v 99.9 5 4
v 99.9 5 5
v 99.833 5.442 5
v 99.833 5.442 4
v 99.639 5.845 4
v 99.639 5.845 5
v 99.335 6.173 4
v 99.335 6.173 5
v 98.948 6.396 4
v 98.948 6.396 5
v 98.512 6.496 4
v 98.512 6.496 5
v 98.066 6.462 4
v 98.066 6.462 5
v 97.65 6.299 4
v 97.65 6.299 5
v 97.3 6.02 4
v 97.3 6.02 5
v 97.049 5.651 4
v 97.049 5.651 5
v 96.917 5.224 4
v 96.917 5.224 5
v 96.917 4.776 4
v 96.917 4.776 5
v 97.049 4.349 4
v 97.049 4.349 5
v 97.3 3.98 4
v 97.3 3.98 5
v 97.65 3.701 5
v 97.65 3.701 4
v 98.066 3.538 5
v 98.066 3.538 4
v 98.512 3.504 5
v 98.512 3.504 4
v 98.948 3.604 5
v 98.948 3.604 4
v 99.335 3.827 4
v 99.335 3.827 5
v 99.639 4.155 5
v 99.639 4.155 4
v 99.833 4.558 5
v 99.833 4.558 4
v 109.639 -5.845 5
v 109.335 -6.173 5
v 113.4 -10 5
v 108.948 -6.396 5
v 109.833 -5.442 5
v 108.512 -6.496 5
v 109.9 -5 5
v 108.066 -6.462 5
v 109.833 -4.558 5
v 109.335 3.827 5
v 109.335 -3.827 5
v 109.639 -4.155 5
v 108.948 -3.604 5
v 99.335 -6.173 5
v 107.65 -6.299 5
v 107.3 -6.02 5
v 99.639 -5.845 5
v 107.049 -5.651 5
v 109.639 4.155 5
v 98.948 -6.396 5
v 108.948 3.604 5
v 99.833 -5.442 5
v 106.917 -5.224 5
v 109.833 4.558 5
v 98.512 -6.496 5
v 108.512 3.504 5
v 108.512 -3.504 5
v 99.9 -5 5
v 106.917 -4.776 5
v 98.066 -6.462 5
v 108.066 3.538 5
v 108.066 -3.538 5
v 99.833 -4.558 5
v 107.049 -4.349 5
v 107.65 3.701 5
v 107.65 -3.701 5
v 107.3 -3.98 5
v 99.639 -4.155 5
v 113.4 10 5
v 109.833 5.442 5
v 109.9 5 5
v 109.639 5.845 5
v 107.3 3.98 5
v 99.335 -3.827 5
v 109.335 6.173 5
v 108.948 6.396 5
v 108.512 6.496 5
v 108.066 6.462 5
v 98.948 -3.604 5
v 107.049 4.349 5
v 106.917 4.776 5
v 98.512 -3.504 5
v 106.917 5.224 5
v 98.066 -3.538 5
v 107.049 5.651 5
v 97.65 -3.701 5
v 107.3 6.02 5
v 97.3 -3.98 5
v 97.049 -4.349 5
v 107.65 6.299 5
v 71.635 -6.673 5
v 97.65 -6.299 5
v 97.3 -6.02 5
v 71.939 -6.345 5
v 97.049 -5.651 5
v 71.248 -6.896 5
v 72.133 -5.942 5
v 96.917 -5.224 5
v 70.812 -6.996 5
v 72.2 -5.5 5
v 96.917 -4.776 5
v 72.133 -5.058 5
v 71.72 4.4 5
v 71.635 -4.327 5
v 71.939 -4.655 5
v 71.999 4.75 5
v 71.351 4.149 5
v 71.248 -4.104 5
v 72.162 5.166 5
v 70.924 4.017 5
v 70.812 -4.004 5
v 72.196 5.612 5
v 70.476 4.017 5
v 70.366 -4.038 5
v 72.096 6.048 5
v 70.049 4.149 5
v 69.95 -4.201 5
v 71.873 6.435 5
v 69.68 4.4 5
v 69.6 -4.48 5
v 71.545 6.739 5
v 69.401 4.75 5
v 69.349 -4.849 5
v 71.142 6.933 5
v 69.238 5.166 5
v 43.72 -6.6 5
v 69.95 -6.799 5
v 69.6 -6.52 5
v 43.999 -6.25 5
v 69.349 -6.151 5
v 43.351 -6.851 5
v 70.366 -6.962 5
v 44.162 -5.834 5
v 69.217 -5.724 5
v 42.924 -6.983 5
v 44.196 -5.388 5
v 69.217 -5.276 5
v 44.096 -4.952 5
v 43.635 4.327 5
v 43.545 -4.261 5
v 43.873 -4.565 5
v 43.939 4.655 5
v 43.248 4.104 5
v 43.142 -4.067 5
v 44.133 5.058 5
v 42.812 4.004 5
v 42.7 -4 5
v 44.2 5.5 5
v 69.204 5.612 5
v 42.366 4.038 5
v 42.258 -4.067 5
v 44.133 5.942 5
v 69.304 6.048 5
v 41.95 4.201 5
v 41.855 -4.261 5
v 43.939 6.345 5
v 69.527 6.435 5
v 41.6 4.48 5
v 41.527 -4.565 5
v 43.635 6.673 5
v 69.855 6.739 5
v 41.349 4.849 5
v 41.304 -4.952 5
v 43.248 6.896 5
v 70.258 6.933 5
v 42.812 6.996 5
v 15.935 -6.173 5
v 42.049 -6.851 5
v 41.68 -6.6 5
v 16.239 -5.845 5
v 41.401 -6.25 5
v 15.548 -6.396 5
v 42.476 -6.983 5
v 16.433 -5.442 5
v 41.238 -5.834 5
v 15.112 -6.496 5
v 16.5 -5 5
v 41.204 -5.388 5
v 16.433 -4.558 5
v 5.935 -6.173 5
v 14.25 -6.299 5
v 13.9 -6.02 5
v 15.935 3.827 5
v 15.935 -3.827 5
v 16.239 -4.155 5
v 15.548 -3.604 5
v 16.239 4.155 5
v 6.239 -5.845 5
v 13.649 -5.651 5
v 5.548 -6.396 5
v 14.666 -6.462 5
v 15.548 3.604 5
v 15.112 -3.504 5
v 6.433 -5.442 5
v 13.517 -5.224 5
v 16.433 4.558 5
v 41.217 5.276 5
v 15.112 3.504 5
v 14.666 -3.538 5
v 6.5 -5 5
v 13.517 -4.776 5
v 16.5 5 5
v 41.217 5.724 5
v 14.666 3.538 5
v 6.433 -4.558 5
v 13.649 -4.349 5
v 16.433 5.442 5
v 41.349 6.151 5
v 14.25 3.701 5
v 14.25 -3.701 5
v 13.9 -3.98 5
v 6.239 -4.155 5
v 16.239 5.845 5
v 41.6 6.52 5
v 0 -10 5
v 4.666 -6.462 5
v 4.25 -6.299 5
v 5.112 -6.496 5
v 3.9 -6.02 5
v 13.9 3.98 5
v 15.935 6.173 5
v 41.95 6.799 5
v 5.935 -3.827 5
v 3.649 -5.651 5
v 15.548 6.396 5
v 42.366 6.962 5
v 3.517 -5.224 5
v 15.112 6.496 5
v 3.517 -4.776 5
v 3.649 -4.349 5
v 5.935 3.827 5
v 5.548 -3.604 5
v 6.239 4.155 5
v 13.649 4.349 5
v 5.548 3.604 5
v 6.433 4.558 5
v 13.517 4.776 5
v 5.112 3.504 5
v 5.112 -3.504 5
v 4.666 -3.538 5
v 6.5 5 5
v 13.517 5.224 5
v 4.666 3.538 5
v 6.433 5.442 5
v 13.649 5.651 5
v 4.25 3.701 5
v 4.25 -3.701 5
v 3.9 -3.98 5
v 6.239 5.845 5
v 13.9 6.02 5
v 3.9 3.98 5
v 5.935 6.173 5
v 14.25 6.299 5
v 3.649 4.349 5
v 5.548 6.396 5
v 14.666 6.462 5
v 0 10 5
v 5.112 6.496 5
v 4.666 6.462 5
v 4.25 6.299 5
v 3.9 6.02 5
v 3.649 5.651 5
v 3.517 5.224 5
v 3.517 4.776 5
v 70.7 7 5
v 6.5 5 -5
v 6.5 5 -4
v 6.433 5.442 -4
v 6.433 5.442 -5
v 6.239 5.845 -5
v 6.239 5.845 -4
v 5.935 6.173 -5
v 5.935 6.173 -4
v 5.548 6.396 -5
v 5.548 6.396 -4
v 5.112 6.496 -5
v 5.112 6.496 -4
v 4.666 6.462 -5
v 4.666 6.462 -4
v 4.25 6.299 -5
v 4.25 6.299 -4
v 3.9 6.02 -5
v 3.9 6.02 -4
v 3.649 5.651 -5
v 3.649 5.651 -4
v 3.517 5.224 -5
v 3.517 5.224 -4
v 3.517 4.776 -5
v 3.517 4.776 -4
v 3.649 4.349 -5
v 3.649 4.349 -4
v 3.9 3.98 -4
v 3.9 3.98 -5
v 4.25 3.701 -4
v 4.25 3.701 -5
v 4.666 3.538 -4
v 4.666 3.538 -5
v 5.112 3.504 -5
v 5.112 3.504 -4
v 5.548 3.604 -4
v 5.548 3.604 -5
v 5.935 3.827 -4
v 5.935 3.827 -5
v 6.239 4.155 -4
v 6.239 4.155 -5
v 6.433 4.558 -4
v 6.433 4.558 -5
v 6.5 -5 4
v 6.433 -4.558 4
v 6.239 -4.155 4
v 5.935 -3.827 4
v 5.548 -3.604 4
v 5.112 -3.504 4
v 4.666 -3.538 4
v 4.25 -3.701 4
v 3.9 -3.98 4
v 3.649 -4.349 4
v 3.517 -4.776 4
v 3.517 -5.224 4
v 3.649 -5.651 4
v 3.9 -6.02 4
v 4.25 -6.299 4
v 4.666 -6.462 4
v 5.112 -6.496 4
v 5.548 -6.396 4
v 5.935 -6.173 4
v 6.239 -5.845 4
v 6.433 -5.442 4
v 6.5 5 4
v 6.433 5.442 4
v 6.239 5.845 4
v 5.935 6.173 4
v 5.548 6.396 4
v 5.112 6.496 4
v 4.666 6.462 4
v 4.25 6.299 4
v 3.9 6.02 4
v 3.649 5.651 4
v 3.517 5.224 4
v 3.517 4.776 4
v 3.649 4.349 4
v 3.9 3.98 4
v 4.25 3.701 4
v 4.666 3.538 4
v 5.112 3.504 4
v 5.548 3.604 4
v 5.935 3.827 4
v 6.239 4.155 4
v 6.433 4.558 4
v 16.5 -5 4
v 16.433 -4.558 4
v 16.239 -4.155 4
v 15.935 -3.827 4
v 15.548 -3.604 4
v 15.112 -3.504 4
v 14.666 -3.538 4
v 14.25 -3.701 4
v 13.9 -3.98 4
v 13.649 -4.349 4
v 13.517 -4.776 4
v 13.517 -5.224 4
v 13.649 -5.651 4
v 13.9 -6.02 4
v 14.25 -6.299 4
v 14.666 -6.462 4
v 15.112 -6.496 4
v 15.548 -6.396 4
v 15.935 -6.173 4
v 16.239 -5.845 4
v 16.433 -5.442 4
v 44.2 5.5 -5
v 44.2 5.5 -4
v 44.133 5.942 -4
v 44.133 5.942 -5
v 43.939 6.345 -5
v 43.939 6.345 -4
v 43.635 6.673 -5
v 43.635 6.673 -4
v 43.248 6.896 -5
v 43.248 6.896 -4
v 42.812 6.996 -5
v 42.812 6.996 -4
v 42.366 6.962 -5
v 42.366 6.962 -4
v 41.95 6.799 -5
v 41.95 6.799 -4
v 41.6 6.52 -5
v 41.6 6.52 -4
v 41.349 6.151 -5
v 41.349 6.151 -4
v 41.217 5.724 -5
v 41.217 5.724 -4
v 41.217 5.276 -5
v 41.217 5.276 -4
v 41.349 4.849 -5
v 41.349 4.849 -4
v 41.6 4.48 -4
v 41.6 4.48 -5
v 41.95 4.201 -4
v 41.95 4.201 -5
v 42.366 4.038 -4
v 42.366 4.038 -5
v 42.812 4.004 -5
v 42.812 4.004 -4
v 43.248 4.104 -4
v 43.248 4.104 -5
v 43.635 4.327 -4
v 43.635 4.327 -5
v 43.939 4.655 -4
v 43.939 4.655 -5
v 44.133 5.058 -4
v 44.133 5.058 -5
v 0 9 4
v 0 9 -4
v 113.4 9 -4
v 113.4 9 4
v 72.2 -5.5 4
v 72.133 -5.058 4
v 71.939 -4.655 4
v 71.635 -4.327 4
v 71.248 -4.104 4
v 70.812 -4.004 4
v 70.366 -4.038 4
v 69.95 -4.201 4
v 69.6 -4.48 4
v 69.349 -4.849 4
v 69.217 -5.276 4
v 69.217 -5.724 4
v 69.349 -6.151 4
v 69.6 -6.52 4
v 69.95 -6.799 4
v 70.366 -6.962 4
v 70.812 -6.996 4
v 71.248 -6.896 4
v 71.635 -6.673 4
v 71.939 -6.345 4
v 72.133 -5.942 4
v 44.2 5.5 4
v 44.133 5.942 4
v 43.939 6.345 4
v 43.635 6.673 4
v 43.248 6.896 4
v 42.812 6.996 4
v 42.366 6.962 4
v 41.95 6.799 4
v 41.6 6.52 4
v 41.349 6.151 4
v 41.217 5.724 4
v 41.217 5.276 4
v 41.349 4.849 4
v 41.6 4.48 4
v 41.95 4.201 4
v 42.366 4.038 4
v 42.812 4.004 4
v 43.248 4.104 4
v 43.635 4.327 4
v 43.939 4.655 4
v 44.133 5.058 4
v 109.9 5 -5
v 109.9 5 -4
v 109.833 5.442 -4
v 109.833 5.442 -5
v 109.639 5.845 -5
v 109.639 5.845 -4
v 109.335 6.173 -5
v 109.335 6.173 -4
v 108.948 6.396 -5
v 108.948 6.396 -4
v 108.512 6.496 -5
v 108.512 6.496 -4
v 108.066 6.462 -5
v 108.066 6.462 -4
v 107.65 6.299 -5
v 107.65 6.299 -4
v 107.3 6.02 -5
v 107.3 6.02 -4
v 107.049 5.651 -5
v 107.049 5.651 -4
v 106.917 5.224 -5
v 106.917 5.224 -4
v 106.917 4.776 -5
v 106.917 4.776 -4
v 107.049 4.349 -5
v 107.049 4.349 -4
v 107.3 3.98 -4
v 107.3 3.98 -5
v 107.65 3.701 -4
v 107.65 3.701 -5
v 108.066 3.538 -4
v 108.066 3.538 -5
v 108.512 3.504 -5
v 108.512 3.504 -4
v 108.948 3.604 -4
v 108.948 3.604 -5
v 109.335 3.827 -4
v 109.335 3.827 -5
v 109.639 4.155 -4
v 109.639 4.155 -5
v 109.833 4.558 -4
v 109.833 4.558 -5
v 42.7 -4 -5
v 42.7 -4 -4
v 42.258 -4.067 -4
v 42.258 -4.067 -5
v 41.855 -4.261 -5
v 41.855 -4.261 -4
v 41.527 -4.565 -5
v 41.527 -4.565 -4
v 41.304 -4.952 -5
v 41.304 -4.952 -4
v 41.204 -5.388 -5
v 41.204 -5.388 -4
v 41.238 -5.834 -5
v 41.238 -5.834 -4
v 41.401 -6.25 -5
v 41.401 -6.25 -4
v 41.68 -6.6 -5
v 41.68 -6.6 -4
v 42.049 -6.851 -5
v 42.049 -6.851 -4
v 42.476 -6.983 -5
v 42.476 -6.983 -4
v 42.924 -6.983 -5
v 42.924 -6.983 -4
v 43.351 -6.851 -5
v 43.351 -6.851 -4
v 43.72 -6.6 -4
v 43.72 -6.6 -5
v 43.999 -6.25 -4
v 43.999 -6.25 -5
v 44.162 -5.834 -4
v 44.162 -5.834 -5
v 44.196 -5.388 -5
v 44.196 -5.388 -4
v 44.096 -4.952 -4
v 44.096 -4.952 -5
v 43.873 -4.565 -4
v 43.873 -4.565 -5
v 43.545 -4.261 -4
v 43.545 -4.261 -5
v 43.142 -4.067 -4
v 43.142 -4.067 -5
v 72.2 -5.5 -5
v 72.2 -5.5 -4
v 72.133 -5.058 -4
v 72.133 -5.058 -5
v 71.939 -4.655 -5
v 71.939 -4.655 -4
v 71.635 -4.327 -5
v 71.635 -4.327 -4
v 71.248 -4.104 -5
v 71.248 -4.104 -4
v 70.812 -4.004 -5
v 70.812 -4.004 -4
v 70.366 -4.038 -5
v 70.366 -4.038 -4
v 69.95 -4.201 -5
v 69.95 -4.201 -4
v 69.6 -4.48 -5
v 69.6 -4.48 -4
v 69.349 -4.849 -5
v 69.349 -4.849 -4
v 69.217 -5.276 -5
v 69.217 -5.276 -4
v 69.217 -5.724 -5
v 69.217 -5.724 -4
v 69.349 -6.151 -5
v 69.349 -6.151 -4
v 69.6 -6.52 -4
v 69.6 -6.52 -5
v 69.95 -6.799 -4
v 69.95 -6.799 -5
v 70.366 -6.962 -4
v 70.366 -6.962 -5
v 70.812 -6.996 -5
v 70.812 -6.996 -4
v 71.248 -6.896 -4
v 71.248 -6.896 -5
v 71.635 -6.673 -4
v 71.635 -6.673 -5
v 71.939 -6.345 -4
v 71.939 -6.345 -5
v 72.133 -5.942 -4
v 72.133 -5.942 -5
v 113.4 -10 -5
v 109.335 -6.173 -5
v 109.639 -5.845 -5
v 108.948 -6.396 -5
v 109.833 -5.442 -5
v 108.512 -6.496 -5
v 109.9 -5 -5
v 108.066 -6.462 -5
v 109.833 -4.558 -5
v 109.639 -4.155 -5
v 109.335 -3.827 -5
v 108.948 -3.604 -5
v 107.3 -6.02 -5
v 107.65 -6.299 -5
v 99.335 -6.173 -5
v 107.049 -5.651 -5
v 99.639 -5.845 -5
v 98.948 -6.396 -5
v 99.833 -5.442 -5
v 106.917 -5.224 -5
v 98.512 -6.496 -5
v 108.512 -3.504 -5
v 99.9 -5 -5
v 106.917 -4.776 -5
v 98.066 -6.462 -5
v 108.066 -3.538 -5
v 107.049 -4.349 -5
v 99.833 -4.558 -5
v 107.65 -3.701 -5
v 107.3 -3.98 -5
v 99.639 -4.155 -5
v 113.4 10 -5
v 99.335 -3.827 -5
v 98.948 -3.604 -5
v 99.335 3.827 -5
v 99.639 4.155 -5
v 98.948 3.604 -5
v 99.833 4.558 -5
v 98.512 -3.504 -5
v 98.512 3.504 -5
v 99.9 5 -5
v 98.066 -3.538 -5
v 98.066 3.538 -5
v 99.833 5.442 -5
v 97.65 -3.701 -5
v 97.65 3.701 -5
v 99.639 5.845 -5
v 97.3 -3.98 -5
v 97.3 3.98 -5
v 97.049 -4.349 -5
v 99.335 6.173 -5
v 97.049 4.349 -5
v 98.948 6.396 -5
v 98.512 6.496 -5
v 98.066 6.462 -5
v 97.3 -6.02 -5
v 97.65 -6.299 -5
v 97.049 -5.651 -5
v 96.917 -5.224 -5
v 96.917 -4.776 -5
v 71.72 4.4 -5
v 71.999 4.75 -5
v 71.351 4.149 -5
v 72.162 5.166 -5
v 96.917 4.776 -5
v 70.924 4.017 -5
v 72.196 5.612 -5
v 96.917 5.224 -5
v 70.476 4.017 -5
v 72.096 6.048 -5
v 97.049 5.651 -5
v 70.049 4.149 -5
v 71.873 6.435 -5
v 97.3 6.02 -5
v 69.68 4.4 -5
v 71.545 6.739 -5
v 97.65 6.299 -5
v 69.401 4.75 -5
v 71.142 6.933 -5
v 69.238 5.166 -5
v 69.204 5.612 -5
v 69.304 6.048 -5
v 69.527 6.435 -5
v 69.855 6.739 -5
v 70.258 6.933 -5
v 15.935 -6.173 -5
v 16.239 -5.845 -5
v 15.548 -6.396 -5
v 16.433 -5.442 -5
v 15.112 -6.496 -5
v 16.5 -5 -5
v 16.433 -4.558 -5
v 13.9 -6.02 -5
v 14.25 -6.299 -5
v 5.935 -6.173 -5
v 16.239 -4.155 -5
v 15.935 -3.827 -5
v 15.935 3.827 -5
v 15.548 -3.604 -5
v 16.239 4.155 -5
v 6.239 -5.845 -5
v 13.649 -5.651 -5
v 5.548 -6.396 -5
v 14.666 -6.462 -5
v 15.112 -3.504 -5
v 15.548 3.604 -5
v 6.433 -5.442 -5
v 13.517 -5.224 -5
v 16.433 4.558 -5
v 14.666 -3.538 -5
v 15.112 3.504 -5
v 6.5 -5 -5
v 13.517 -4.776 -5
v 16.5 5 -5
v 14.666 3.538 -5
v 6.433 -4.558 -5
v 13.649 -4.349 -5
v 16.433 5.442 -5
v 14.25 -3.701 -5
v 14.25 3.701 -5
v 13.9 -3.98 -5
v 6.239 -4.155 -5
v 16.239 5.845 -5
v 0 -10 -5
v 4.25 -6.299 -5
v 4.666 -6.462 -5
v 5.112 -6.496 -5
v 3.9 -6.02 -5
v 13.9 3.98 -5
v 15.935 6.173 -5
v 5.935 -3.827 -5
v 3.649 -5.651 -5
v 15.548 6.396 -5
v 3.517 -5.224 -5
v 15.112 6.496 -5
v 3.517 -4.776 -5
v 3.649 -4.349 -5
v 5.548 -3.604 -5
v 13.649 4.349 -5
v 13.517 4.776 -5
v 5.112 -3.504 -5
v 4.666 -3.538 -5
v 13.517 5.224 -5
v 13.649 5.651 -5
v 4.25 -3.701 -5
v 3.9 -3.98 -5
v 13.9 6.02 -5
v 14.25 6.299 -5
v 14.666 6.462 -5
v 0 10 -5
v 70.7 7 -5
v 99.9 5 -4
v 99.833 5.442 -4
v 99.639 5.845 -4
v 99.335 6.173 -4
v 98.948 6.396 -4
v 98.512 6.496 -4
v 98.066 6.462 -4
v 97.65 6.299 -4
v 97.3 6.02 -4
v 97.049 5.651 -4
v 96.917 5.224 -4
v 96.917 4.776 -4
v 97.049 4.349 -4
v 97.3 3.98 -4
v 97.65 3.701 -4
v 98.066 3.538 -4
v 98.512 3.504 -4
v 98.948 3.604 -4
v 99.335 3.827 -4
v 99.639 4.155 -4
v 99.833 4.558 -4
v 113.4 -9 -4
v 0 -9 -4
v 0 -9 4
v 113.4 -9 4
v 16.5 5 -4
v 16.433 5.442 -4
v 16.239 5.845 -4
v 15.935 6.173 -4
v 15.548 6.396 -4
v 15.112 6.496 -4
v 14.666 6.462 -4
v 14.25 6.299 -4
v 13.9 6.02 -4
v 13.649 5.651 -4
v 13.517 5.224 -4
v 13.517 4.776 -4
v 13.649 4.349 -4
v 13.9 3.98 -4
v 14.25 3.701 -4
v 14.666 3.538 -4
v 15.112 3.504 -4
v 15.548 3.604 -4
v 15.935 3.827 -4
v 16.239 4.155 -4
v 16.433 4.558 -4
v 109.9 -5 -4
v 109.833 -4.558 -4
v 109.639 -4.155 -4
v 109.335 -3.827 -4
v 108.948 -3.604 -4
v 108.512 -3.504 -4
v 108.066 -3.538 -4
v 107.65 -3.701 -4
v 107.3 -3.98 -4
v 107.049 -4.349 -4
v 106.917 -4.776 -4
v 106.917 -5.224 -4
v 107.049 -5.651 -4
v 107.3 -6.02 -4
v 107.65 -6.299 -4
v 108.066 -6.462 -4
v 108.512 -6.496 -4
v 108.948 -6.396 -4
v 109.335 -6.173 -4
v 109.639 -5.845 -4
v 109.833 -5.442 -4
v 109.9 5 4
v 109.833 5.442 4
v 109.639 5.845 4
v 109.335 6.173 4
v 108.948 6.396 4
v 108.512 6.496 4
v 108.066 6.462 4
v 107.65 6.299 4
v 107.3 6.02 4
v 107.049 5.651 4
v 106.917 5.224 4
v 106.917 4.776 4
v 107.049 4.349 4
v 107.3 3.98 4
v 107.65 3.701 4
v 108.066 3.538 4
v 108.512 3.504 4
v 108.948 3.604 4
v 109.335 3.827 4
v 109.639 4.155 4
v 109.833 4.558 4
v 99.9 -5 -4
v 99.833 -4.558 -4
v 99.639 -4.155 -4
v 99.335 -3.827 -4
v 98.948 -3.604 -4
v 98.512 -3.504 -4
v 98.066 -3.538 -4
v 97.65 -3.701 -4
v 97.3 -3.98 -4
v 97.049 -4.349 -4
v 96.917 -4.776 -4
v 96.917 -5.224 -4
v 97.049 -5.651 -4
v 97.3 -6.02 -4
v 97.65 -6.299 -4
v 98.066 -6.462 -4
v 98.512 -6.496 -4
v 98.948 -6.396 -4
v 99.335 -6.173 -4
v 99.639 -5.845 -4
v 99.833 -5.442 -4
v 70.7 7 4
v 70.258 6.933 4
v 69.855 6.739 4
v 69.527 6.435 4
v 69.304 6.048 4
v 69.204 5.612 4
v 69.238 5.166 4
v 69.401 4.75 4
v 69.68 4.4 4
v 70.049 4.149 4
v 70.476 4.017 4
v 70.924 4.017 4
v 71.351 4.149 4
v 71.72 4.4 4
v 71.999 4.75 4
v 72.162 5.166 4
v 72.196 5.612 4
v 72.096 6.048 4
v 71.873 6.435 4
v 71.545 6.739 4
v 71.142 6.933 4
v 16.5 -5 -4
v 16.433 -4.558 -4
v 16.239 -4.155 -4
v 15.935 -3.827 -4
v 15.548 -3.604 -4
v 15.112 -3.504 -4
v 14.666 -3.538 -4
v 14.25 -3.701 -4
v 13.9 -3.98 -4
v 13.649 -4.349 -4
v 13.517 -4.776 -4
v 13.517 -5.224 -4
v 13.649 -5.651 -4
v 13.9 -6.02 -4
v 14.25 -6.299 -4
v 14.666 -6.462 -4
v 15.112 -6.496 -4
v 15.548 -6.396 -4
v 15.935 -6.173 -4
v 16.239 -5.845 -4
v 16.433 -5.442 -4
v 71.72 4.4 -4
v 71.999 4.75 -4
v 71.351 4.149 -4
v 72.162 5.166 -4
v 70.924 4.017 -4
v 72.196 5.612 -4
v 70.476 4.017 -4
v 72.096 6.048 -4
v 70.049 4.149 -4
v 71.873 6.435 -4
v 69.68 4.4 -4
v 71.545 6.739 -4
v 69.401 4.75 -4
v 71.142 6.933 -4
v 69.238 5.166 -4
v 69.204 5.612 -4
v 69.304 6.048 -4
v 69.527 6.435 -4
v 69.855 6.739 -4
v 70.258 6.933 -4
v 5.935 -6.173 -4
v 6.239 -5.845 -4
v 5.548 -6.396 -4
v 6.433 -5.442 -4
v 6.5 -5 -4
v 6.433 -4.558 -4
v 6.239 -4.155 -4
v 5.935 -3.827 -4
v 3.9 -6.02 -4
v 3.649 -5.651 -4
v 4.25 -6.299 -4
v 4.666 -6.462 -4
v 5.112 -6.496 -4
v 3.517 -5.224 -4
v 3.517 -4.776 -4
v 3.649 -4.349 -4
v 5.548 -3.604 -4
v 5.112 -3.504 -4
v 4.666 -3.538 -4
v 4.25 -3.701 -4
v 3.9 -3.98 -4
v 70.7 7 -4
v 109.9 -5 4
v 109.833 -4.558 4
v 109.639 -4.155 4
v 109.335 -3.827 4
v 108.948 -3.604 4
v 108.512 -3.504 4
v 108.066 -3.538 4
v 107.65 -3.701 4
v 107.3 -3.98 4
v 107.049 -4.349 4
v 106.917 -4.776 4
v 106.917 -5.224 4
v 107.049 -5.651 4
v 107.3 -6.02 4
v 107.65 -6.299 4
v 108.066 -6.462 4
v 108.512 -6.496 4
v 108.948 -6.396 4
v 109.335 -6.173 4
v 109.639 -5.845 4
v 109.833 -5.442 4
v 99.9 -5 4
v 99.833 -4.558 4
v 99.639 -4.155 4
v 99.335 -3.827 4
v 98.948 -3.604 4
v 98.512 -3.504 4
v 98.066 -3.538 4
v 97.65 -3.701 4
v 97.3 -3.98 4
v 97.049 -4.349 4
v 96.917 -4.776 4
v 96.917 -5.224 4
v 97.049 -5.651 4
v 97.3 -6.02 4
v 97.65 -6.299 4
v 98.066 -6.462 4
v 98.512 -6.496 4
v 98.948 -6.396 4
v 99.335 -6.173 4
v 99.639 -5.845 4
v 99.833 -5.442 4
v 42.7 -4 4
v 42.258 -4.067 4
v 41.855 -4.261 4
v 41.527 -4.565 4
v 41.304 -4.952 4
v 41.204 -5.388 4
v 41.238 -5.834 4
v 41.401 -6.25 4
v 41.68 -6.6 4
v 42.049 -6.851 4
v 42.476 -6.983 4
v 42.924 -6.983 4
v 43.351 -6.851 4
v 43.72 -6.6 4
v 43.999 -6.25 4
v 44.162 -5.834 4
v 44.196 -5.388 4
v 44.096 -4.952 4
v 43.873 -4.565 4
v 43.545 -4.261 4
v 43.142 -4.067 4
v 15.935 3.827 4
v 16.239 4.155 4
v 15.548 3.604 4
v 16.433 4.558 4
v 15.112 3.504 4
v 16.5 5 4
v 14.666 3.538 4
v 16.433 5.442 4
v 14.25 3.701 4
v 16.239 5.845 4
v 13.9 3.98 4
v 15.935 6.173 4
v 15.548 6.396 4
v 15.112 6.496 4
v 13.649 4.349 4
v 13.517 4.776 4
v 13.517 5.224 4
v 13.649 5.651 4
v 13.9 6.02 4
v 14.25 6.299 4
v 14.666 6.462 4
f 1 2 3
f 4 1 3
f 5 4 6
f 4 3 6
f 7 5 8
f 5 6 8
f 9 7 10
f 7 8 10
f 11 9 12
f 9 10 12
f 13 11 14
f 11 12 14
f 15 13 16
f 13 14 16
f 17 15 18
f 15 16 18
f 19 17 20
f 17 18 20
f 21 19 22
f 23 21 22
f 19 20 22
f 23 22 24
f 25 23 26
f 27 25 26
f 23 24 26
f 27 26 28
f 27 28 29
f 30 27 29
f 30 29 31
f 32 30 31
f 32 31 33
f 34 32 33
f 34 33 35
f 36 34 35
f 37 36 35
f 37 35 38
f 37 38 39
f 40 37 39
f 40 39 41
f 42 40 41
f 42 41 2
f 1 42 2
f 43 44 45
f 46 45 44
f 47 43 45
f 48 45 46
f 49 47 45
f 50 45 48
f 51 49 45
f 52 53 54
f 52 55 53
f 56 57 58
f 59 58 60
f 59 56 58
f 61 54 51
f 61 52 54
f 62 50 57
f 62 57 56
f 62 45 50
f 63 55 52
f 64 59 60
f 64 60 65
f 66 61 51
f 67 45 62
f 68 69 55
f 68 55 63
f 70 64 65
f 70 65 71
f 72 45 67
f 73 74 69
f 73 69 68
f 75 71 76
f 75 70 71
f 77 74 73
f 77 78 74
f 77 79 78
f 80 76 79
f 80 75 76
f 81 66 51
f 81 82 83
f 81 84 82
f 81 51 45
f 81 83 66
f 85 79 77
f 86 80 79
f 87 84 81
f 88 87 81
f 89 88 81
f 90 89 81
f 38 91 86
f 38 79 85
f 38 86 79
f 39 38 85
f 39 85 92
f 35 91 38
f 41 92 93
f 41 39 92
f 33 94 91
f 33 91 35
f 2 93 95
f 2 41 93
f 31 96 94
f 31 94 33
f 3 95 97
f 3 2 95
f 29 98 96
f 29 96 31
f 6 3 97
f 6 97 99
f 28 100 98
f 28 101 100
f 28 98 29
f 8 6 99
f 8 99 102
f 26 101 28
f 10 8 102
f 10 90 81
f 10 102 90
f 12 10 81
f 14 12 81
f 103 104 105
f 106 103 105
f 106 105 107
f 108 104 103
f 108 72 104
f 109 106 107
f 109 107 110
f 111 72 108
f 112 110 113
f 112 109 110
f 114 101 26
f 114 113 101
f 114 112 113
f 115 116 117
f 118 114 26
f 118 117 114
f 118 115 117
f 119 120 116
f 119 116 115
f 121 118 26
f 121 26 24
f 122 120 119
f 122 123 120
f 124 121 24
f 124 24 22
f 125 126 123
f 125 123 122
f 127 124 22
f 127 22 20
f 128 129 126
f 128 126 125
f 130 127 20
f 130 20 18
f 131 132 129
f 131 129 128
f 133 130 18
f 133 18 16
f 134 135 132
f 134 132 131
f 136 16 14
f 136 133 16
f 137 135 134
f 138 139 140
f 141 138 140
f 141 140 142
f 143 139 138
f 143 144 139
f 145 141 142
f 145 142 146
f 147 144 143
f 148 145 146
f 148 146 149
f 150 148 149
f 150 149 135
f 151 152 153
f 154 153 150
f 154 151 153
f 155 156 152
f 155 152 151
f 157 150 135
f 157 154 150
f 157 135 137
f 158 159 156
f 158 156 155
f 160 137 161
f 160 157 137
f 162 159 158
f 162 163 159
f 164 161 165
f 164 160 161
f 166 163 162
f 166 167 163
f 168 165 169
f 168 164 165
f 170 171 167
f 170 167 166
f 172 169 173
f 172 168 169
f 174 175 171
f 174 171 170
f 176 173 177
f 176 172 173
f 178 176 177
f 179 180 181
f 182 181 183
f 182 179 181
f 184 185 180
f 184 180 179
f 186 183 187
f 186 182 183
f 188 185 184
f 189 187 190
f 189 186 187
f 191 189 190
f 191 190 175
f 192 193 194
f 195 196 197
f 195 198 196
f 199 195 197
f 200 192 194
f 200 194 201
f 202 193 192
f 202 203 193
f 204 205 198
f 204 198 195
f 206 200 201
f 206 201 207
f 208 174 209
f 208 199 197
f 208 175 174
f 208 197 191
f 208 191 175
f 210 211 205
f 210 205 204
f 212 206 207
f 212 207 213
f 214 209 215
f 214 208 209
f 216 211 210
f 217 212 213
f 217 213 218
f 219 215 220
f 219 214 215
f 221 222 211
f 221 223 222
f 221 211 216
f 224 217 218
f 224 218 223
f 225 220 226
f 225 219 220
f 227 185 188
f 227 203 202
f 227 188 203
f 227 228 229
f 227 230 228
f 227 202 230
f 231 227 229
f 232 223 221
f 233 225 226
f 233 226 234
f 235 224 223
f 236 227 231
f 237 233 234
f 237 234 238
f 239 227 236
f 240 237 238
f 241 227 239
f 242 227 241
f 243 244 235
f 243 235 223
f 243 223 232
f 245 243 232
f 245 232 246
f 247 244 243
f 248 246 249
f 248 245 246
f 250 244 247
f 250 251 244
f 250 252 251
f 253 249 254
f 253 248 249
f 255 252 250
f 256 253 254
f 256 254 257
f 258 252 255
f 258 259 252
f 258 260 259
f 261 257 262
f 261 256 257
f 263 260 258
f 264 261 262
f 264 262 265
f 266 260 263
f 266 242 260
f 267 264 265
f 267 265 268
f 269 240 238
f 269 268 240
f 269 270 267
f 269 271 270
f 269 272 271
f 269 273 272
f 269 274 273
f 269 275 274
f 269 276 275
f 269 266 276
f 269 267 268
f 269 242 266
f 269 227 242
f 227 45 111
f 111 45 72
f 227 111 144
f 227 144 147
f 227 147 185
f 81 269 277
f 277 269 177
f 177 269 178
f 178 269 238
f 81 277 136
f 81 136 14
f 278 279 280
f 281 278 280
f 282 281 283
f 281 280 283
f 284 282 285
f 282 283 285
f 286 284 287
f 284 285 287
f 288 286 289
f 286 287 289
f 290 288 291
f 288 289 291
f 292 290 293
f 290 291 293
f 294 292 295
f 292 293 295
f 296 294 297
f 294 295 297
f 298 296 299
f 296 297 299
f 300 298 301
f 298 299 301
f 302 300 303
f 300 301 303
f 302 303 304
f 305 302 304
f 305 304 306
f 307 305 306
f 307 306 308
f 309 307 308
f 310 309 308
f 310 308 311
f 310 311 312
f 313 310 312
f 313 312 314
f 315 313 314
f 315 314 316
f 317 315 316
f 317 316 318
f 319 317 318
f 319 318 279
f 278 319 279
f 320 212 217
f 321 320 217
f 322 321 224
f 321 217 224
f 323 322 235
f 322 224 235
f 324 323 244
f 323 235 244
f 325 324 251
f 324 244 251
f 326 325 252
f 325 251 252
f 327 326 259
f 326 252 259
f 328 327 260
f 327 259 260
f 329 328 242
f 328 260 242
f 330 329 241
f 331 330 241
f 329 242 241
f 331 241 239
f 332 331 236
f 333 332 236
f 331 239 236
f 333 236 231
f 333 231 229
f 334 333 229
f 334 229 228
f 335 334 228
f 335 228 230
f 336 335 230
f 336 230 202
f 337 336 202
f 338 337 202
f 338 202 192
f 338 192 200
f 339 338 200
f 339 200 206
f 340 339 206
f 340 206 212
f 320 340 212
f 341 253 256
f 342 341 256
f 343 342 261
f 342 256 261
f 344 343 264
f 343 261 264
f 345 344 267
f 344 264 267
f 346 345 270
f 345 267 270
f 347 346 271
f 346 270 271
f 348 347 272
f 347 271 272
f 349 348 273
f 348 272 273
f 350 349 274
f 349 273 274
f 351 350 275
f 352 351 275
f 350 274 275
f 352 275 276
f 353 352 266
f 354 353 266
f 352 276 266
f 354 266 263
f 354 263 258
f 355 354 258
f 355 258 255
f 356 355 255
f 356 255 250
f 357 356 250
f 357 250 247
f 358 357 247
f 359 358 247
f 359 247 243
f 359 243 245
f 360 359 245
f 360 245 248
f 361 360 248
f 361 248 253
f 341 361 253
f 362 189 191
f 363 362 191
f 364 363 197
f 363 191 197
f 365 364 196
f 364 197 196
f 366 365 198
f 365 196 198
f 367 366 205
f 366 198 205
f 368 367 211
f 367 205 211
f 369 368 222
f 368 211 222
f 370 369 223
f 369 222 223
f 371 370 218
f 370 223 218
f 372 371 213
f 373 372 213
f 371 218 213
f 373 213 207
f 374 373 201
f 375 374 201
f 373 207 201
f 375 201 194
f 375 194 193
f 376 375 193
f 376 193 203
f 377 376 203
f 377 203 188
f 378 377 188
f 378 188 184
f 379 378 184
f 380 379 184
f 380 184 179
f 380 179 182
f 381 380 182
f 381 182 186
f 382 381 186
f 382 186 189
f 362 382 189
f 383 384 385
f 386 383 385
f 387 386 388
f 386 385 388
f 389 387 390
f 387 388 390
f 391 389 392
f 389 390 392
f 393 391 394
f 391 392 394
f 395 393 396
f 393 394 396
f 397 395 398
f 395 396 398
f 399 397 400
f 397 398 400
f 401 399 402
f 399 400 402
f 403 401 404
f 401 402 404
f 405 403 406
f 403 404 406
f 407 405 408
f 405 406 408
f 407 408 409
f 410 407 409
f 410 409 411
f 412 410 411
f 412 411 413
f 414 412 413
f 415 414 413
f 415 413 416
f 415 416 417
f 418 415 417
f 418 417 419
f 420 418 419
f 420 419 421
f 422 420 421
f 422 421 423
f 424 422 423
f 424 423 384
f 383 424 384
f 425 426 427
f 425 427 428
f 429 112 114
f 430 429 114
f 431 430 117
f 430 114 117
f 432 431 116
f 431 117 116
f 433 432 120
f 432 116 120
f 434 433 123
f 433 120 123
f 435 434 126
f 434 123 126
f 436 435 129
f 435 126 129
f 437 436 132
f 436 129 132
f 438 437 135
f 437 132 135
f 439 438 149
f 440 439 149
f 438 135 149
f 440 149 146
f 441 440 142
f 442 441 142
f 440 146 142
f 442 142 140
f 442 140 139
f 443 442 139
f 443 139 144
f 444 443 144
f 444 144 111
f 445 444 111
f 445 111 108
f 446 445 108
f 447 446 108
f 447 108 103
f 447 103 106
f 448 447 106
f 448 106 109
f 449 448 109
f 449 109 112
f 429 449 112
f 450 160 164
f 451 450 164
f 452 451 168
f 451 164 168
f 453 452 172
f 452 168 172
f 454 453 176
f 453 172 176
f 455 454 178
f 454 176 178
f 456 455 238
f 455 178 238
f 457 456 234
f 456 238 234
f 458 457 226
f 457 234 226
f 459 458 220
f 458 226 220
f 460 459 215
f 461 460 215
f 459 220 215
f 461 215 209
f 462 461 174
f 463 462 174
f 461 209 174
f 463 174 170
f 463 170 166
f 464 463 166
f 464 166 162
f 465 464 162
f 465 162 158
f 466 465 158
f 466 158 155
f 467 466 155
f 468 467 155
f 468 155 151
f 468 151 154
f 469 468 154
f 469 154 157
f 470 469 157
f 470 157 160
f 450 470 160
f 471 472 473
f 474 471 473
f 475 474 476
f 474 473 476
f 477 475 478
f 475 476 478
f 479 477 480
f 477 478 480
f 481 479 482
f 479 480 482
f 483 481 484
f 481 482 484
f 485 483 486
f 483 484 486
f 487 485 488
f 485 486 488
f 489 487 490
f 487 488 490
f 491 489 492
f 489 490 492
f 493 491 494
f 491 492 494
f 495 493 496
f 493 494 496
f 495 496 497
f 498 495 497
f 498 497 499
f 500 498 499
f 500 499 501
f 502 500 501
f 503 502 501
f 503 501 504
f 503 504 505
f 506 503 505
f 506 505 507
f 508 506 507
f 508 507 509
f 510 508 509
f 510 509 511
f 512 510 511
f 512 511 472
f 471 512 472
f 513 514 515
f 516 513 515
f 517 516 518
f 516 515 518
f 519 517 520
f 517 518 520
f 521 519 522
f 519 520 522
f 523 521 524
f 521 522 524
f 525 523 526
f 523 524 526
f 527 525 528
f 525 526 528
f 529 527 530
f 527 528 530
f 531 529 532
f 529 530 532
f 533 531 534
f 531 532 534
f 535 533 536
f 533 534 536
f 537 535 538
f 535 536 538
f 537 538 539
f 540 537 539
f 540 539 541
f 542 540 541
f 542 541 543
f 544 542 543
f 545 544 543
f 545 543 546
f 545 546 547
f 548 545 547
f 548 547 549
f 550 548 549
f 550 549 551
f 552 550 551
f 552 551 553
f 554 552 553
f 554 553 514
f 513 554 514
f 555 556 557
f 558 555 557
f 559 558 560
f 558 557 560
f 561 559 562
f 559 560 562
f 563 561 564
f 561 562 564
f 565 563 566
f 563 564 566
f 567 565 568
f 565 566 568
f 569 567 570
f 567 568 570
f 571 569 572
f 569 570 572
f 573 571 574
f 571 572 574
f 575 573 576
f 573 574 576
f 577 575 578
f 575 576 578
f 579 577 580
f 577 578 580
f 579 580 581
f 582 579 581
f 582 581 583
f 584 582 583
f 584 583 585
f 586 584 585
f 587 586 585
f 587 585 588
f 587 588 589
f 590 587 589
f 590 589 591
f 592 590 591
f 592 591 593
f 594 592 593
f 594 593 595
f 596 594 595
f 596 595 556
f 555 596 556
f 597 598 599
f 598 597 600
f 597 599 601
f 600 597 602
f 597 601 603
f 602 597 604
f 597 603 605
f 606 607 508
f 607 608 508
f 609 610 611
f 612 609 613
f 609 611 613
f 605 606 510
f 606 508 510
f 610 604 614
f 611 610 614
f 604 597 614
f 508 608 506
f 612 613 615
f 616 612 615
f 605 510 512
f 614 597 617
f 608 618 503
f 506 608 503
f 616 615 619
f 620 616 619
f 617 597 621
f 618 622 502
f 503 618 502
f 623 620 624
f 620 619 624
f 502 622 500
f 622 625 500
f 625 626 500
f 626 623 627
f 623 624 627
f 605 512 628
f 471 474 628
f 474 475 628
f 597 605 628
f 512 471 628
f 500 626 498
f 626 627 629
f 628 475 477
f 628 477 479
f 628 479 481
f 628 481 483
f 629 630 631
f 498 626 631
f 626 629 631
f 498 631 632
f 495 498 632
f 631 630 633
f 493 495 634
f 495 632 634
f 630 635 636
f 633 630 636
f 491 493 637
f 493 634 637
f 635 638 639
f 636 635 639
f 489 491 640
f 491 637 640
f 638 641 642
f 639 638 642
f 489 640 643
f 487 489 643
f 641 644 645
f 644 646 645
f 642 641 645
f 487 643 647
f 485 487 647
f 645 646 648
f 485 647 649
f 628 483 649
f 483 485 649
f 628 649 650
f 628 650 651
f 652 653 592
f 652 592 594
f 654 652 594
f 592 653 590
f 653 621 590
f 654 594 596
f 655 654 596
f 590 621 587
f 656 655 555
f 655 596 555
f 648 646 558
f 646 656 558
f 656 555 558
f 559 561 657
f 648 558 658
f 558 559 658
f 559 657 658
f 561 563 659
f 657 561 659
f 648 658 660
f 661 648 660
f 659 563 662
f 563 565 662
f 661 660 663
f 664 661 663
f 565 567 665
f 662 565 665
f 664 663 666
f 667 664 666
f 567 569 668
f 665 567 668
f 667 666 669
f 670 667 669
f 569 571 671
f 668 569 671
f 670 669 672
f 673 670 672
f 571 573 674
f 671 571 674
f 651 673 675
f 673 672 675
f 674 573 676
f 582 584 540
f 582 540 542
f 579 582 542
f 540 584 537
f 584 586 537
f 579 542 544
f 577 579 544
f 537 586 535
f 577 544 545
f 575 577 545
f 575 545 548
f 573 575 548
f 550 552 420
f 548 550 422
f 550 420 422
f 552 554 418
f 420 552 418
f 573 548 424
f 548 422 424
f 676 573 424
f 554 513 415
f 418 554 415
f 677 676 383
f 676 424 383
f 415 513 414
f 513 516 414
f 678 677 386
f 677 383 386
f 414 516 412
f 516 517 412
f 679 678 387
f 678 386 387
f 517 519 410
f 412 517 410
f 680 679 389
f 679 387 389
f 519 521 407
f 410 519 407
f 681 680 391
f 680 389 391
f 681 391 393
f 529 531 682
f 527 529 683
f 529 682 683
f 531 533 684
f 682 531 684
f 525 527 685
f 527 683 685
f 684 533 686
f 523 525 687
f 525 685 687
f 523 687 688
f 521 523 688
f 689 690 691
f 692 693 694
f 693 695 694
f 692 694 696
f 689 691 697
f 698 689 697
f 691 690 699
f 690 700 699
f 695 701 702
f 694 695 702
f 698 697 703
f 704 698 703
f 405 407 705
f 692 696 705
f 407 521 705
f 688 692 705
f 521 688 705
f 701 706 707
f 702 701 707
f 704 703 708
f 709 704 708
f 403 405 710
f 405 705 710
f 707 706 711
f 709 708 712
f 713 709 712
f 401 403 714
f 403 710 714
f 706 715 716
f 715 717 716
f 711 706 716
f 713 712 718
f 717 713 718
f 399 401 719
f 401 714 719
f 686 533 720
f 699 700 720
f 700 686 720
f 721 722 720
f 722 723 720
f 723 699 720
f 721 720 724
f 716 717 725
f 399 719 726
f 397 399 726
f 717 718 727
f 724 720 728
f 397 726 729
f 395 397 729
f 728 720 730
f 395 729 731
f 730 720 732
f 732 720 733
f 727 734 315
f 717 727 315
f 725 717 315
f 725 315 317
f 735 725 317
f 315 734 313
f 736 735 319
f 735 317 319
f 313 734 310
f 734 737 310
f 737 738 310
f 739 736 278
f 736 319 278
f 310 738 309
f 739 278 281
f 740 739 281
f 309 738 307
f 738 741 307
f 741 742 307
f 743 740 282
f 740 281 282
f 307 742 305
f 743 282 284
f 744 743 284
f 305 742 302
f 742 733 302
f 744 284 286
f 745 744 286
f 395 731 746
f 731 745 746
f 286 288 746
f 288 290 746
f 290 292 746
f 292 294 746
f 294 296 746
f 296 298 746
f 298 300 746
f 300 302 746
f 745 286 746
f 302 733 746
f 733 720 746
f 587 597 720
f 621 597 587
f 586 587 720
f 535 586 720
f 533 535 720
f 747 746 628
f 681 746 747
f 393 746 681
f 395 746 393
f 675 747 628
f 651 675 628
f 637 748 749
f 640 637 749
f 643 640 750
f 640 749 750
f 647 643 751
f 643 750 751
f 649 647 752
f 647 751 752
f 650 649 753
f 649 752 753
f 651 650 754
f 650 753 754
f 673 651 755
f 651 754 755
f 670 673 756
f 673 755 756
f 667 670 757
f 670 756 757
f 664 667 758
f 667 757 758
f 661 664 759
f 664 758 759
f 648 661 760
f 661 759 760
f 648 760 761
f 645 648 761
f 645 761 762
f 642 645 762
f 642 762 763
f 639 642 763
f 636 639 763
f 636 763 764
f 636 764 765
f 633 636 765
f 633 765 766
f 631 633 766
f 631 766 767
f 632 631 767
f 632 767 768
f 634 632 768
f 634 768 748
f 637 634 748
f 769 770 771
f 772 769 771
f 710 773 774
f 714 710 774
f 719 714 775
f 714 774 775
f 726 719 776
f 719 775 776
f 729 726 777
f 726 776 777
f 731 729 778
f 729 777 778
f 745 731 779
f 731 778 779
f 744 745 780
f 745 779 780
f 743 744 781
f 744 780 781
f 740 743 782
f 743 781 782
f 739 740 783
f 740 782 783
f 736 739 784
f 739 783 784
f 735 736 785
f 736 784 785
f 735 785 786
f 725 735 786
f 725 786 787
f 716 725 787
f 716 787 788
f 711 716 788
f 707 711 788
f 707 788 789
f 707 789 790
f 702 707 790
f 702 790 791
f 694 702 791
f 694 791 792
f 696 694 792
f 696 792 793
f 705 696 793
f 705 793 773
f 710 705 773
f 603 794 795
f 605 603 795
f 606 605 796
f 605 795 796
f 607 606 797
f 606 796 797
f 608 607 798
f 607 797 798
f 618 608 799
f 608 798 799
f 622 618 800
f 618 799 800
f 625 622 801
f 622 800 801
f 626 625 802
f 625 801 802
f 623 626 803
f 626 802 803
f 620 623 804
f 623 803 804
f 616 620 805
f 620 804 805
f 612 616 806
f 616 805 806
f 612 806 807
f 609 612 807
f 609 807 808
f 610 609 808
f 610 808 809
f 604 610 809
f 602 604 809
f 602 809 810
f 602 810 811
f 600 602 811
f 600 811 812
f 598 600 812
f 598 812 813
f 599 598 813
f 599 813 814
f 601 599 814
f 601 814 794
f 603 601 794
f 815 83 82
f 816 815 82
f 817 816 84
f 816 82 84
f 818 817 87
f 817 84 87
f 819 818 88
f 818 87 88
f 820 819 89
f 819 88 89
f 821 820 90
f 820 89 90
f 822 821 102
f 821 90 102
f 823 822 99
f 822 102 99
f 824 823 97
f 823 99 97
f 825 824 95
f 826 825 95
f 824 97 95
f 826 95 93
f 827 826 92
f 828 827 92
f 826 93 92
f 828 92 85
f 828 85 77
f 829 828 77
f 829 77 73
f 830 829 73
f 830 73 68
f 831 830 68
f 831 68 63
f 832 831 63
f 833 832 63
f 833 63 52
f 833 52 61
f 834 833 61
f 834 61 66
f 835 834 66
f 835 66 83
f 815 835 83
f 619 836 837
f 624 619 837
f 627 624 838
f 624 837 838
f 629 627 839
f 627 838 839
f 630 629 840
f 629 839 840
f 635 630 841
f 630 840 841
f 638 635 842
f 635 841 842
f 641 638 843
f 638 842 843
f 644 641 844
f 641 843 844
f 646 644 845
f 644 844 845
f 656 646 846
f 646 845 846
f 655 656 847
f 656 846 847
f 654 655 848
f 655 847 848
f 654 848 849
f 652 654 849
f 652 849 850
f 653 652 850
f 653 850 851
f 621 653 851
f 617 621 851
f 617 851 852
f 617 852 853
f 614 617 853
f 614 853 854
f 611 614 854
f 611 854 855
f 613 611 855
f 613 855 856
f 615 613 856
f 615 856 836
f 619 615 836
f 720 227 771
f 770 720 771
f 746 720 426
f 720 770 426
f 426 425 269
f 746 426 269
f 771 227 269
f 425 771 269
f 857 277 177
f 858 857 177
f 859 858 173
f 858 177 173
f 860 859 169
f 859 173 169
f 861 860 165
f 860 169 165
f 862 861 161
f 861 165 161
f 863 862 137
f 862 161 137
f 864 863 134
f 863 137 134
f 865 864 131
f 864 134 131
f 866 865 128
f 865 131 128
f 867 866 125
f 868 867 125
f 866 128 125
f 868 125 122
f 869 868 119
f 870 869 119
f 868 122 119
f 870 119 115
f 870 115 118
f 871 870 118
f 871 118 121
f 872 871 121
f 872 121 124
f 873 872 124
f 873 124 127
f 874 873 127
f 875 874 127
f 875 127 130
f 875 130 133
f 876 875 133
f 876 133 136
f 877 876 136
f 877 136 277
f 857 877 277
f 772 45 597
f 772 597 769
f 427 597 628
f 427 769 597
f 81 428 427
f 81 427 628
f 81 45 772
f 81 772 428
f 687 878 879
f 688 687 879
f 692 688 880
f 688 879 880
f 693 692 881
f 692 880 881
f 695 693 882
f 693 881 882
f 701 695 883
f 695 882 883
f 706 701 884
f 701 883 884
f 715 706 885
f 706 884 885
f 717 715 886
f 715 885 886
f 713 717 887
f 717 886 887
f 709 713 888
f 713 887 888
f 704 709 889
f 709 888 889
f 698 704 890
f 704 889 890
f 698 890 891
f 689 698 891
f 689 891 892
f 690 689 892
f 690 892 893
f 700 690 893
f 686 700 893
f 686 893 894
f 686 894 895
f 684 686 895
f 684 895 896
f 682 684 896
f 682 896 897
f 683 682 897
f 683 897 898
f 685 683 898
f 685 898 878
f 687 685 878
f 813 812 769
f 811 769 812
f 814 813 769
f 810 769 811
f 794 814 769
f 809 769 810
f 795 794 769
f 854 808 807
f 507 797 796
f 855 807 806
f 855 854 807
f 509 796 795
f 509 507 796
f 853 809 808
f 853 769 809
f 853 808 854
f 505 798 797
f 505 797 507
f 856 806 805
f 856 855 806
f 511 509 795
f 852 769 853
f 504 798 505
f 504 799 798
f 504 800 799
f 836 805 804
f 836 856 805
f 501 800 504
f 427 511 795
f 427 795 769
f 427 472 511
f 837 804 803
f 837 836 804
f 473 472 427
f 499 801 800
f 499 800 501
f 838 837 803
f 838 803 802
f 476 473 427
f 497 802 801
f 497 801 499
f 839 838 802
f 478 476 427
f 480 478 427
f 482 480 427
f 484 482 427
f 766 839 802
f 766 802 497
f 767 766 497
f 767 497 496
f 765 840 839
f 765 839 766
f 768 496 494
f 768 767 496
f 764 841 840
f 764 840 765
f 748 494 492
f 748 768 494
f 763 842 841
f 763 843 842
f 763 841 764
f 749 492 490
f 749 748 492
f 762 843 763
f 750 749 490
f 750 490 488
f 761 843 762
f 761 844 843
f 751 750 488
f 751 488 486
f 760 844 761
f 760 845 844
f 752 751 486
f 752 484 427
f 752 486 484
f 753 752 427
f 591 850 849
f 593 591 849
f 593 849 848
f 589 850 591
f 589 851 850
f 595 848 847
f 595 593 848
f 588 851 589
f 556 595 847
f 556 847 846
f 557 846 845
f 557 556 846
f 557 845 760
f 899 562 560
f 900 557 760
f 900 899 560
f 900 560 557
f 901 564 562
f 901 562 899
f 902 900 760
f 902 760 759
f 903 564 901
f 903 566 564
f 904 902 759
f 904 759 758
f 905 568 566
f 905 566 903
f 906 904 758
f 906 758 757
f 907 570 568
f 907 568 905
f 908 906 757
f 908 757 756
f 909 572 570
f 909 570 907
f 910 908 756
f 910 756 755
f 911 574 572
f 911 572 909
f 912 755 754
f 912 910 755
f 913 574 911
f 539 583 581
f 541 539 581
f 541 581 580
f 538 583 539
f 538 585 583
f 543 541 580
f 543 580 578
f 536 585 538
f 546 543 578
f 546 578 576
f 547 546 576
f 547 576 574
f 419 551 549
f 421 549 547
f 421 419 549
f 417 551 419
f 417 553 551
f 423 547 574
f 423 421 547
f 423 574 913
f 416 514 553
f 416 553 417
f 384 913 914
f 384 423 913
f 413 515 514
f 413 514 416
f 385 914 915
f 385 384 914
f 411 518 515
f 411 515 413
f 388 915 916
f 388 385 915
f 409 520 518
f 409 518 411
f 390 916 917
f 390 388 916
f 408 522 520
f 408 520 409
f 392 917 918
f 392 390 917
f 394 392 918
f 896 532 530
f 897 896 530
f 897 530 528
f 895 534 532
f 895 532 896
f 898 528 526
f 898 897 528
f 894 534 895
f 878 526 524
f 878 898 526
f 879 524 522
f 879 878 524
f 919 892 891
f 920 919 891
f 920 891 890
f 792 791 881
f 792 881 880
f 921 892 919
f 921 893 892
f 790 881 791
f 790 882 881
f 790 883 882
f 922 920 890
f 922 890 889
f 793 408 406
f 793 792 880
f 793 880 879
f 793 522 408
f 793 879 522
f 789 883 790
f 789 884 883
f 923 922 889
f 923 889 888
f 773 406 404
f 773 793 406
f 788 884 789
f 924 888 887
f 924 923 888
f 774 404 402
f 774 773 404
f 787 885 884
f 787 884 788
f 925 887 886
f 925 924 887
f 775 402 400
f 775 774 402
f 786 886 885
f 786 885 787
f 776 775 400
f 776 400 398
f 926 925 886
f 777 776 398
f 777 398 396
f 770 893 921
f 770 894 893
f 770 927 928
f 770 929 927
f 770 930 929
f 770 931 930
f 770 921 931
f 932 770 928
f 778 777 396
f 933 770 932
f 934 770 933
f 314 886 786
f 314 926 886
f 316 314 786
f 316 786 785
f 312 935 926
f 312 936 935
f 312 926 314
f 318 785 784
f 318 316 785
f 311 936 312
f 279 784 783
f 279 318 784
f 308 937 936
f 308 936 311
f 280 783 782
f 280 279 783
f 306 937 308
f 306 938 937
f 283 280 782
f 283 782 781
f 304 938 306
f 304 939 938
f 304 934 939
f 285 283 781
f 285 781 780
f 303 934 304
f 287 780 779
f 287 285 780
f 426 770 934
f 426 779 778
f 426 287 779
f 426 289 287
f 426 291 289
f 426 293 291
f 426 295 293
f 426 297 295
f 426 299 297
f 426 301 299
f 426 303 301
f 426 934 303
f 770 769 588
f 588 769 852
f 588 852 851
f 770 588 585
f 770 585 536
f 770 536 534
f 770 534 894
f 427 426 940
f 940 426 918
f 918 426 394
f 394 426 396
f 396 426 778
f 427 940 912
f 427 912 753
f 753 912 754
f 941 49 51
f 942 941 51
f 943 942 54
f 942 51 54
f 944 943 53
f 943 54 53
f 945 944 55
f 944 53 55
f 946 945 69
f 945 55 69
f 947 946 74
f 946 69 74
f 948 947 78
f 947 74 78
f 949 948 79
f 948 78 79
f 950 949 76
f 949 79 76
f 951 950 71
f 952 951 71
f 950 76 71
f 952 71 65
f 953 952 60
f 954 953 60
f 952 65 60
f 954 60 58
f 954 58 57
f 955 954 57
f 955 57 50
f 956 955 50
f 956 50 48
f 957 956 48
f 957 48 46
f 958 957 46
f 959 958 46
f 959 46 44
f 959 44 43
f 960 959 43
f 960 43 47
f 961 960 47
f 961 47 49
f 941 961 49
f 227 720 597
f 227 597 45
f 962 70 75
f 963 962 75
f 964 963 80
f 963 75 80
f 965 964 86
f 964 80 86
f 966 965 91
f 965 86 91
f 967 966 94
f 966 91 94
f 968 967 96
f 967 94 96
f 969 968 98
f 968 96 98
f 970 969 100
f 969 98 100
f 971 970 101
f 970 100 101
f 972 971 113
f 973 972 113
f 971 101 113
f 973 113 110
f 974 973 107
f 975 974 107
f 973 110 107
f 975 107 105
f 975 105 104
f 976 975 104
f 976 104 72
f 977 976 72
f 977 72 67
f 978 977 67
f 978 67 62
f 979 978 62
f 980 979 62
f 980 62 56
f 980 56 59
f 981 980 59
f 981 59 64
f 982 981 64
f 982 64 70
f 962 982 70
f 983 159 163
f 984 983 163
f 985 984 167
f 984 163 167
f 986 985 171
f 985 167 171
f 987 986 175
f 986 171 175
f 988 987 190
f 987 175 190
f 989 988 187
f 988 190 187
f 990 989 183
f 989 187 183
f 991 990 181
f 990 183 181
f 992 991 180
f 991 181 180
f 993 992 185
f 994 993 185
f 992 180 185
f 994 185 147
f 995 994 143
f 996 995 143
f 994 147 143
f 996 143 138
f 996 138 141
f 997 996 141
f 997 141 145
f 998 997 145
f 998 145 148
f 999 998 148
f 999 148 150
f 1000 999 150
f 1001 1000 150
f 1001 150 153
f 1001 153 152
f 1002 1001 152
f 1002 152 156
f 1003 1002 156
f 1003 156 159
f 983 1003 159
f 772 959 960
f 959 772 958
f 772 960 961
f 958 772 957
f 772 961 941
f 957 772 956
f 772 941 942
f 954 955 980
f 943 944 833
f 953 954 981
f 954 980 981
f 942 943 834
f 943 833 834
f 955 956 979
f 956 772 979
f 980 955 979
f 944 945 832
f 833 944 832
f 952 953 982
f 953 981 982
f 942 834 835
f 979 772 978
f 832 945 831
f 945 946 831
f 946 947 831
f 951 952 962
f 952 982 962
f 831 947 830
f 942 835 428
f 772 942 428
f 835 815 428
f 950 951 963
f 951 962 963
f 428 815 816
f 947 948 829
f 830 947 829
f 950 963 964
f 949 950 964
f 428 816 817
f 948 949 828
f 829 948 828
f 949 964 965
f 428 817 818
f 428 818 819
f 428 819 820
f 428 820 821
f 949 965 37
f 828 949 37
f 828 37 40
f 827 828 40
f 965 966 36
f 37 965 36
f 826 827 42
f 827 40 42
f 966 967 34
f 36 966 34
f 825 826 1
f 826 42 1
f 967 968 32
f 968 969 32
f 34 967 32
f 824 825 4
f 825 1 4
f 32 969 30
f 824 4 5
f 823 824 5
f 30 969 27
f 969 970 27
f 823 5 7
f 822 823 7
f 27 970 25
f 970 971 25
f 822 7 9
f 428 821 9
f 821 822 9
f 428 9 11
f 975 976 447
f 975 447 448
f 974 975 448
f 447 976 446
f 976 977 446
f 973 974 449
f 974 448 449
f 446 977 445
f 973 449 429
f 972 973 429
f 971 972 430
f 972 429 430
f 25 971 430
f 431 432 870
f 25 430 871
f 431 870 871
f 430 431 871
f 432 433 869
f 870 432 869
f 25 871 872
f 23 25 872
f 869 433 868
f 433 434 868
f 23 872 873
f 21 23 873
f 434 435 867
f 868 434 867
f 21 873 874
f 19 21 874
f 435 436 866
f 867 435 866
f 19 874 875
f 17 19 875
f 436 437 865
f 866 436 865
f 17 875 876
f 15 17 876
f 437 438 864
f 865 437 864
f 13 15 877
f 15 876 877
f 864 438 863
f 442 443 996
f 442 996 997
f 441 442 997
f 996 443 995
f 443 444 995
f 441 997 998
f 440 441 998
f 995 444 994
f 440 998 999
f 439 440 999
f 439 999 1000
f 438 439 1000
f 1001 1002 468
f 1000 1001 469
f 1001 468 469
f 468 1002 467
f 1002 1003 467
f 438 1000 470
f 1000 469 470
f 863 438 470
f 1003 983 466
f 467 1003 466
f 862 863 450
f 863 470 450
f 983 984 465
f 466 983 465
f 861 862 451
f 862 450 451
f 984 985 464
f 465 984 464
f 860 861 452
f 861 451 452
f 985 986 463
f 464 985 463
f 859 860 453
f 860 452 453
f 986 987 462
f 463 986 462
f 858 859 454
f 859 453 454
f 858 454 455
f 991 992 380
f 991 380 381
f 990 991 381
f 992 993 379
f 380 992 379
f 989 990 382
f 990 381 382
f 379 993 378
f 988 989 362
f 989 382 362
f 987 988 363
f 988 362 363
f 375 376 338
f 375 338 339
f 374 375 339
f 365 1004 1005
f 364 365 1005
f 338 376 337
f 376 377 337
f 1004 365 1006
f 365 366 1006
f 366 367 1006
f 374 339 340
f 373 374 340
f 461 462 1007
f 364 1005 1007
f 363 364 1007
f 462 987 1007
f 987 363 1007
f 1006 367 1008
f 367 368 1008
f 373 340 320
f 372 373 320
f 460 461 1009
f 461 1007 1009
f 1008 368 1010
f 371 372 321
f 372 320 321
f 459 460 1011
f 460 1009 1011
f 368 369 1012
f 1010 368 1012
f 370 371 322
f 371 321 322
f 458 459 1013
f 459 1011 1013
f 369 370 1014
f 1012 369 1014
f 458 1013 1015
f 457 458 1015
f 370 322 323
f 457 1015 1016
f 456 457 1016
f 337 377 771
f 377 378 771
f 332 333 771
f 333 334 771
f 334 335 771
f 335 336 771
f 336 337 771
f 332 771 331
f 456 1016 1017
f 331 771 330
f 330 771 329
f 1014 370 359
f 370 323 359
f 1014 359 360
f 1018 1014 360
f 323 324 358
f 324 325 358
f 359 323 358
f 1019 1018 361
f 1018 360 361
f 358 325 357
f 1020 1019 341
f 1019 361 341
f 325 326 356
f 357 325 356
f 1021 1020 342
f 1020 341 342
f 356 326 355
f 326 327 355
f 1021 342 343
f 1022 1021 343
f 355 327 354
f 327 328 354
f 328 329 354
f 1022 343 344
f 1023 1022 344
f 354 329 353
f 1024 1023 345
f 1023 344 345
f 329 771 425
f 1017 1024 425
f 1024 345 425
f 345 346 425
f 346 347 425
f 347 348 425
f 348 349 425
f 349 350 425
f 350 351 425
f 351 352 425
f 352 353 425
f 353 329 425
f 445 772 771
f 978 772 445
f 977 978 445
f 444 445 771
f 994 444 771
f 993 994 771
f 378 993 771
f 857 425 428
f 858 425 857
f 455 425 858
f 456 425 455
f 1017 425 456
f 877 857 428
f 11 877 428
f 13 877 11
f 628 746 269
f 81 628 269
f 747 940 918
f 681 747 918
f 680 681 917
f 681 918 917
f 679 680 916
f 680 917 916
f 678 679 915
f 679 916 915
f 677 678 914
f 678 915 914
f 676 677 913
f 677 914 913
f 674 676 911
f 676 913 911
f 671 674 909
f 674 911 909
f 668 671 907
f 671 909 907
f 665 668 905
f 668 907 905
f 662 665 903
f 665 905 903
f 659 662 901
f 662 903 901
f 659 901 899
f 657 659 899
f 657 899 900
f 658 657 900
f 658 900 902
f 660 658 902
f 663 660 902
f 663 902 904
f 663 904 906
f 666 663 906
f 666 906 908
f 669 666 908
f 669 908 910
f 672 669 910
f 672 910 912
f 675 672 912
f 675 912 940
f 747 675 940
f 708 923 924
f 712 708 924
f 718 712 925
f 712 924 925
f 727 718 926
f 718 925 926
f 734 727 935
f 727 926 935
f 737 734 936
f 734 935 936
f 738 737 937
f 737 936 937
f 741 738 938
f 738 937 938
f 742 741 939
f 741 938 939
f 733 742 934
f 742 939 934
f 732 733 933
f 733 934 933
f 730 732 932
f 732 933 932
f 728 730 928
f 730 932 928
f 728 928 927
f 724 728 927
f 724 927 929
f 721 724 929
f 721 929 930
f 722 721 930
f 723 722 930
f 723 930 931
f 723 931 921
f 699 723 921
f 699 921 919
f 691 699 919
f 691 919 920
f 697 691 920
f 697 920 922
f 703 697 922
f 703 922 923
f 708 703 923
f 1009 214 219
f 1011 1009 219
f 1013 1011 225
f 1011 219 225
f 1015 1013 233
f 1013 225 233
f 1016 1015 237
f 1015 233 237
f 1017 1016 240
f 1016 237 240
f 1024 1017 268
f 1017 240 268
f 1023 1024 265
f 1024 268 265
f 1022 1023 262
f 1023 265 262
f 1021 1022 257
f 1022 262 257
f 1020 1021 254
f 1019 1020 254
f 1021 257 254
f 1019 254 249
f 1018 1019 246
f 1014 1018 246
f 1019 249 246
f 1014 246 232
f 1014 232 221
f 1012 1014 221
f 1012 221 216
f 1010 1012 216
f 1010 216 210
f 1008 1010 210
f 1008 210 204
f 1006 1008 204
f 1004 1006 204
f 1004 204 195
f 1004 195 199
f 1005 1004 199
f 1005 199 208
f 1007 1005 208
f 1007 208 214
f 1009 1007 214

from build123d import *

# Parameters (mm, degrees)
SKETCH_11_W                = 20
SKETCH_11_H                = 10
SKETCH_11_W_2              = 18
SKETCH_11_H_2              = 8
JIQIRENDUI_20X10X1_1_DEPTH = 113.4
SKETCH_12_R                = 1.5
CUT_EXTRUDE_1_DEPTH        = 10
SKETCH_13_R                = 1.5
CUT_EXTRUDE_2_DEPTH        = 115.278431911


with BuildPart() as part:
    # 草图11 → Jiqirendui 20X10X1(1) (new body)
    with BuildSketch(Plane.YZ):
        Rectangle(SKETCH_11_W, SKETCH_11_H)
        Rectangle(SKETCH_11_W_2, SKETCH_11_H_2, mode=Mode.SUBTRACT)
    extrude(amount=JIQIRENDUI_20X10X1_1_DEPTH)

    # 草图12 → 切除-拉伸1 (cut)
    with BuildSketch(Plane.XY.offset(5)):
        with Locations((15, 5)):
            Circle(SKETCH_12_R)
        with Locations((5, 5)):
            Circle(SKETCH_12_R)
        with Locations((15, -5)):
            Circle(SKETCH_12_R)
        with Locations((5, -5)):
            Circle(SKETCH_12_R)
        with Locations((108.4, -5)):
            Circle(SKETCH_12_R)
        with Locations((108.4, 5)):
            Circle(SKETCH_12_R)
        with Locations((98.4, 5)):
            Circle(SKETCH_12_R)
        with Locations((98.4, -5)):
            Circle(SKETCH_12_R)
    extrude(amount=-CUT_EXTRUDE_1_DEPTH, mode=Mode.SUBTRACT)

    # 草图13 → 切除-拉伸2 (cut, through all)
    with BuildSketch(Plane.XY.offset(5)):
        with Locations((42.7, 5.5)):
            Circle(SKETCH_13_R)
        with Locations(Location((70.7, 5.5, 0), (0, 0, 90))):
            Circle(SKETCH_13_R)
        with Locations((70.7, -5.5)):
            Circle(SKETCH_13_R)
        with Locations(Location((42.7, -5.5, 0), (0, 0, 90))):
            Circle(SKETCH_13_R)
    extrude(amount=-CUT_EXTRUDE_2_DEPTH, mode=Mode.SUBTRACT)


solid = part.part
